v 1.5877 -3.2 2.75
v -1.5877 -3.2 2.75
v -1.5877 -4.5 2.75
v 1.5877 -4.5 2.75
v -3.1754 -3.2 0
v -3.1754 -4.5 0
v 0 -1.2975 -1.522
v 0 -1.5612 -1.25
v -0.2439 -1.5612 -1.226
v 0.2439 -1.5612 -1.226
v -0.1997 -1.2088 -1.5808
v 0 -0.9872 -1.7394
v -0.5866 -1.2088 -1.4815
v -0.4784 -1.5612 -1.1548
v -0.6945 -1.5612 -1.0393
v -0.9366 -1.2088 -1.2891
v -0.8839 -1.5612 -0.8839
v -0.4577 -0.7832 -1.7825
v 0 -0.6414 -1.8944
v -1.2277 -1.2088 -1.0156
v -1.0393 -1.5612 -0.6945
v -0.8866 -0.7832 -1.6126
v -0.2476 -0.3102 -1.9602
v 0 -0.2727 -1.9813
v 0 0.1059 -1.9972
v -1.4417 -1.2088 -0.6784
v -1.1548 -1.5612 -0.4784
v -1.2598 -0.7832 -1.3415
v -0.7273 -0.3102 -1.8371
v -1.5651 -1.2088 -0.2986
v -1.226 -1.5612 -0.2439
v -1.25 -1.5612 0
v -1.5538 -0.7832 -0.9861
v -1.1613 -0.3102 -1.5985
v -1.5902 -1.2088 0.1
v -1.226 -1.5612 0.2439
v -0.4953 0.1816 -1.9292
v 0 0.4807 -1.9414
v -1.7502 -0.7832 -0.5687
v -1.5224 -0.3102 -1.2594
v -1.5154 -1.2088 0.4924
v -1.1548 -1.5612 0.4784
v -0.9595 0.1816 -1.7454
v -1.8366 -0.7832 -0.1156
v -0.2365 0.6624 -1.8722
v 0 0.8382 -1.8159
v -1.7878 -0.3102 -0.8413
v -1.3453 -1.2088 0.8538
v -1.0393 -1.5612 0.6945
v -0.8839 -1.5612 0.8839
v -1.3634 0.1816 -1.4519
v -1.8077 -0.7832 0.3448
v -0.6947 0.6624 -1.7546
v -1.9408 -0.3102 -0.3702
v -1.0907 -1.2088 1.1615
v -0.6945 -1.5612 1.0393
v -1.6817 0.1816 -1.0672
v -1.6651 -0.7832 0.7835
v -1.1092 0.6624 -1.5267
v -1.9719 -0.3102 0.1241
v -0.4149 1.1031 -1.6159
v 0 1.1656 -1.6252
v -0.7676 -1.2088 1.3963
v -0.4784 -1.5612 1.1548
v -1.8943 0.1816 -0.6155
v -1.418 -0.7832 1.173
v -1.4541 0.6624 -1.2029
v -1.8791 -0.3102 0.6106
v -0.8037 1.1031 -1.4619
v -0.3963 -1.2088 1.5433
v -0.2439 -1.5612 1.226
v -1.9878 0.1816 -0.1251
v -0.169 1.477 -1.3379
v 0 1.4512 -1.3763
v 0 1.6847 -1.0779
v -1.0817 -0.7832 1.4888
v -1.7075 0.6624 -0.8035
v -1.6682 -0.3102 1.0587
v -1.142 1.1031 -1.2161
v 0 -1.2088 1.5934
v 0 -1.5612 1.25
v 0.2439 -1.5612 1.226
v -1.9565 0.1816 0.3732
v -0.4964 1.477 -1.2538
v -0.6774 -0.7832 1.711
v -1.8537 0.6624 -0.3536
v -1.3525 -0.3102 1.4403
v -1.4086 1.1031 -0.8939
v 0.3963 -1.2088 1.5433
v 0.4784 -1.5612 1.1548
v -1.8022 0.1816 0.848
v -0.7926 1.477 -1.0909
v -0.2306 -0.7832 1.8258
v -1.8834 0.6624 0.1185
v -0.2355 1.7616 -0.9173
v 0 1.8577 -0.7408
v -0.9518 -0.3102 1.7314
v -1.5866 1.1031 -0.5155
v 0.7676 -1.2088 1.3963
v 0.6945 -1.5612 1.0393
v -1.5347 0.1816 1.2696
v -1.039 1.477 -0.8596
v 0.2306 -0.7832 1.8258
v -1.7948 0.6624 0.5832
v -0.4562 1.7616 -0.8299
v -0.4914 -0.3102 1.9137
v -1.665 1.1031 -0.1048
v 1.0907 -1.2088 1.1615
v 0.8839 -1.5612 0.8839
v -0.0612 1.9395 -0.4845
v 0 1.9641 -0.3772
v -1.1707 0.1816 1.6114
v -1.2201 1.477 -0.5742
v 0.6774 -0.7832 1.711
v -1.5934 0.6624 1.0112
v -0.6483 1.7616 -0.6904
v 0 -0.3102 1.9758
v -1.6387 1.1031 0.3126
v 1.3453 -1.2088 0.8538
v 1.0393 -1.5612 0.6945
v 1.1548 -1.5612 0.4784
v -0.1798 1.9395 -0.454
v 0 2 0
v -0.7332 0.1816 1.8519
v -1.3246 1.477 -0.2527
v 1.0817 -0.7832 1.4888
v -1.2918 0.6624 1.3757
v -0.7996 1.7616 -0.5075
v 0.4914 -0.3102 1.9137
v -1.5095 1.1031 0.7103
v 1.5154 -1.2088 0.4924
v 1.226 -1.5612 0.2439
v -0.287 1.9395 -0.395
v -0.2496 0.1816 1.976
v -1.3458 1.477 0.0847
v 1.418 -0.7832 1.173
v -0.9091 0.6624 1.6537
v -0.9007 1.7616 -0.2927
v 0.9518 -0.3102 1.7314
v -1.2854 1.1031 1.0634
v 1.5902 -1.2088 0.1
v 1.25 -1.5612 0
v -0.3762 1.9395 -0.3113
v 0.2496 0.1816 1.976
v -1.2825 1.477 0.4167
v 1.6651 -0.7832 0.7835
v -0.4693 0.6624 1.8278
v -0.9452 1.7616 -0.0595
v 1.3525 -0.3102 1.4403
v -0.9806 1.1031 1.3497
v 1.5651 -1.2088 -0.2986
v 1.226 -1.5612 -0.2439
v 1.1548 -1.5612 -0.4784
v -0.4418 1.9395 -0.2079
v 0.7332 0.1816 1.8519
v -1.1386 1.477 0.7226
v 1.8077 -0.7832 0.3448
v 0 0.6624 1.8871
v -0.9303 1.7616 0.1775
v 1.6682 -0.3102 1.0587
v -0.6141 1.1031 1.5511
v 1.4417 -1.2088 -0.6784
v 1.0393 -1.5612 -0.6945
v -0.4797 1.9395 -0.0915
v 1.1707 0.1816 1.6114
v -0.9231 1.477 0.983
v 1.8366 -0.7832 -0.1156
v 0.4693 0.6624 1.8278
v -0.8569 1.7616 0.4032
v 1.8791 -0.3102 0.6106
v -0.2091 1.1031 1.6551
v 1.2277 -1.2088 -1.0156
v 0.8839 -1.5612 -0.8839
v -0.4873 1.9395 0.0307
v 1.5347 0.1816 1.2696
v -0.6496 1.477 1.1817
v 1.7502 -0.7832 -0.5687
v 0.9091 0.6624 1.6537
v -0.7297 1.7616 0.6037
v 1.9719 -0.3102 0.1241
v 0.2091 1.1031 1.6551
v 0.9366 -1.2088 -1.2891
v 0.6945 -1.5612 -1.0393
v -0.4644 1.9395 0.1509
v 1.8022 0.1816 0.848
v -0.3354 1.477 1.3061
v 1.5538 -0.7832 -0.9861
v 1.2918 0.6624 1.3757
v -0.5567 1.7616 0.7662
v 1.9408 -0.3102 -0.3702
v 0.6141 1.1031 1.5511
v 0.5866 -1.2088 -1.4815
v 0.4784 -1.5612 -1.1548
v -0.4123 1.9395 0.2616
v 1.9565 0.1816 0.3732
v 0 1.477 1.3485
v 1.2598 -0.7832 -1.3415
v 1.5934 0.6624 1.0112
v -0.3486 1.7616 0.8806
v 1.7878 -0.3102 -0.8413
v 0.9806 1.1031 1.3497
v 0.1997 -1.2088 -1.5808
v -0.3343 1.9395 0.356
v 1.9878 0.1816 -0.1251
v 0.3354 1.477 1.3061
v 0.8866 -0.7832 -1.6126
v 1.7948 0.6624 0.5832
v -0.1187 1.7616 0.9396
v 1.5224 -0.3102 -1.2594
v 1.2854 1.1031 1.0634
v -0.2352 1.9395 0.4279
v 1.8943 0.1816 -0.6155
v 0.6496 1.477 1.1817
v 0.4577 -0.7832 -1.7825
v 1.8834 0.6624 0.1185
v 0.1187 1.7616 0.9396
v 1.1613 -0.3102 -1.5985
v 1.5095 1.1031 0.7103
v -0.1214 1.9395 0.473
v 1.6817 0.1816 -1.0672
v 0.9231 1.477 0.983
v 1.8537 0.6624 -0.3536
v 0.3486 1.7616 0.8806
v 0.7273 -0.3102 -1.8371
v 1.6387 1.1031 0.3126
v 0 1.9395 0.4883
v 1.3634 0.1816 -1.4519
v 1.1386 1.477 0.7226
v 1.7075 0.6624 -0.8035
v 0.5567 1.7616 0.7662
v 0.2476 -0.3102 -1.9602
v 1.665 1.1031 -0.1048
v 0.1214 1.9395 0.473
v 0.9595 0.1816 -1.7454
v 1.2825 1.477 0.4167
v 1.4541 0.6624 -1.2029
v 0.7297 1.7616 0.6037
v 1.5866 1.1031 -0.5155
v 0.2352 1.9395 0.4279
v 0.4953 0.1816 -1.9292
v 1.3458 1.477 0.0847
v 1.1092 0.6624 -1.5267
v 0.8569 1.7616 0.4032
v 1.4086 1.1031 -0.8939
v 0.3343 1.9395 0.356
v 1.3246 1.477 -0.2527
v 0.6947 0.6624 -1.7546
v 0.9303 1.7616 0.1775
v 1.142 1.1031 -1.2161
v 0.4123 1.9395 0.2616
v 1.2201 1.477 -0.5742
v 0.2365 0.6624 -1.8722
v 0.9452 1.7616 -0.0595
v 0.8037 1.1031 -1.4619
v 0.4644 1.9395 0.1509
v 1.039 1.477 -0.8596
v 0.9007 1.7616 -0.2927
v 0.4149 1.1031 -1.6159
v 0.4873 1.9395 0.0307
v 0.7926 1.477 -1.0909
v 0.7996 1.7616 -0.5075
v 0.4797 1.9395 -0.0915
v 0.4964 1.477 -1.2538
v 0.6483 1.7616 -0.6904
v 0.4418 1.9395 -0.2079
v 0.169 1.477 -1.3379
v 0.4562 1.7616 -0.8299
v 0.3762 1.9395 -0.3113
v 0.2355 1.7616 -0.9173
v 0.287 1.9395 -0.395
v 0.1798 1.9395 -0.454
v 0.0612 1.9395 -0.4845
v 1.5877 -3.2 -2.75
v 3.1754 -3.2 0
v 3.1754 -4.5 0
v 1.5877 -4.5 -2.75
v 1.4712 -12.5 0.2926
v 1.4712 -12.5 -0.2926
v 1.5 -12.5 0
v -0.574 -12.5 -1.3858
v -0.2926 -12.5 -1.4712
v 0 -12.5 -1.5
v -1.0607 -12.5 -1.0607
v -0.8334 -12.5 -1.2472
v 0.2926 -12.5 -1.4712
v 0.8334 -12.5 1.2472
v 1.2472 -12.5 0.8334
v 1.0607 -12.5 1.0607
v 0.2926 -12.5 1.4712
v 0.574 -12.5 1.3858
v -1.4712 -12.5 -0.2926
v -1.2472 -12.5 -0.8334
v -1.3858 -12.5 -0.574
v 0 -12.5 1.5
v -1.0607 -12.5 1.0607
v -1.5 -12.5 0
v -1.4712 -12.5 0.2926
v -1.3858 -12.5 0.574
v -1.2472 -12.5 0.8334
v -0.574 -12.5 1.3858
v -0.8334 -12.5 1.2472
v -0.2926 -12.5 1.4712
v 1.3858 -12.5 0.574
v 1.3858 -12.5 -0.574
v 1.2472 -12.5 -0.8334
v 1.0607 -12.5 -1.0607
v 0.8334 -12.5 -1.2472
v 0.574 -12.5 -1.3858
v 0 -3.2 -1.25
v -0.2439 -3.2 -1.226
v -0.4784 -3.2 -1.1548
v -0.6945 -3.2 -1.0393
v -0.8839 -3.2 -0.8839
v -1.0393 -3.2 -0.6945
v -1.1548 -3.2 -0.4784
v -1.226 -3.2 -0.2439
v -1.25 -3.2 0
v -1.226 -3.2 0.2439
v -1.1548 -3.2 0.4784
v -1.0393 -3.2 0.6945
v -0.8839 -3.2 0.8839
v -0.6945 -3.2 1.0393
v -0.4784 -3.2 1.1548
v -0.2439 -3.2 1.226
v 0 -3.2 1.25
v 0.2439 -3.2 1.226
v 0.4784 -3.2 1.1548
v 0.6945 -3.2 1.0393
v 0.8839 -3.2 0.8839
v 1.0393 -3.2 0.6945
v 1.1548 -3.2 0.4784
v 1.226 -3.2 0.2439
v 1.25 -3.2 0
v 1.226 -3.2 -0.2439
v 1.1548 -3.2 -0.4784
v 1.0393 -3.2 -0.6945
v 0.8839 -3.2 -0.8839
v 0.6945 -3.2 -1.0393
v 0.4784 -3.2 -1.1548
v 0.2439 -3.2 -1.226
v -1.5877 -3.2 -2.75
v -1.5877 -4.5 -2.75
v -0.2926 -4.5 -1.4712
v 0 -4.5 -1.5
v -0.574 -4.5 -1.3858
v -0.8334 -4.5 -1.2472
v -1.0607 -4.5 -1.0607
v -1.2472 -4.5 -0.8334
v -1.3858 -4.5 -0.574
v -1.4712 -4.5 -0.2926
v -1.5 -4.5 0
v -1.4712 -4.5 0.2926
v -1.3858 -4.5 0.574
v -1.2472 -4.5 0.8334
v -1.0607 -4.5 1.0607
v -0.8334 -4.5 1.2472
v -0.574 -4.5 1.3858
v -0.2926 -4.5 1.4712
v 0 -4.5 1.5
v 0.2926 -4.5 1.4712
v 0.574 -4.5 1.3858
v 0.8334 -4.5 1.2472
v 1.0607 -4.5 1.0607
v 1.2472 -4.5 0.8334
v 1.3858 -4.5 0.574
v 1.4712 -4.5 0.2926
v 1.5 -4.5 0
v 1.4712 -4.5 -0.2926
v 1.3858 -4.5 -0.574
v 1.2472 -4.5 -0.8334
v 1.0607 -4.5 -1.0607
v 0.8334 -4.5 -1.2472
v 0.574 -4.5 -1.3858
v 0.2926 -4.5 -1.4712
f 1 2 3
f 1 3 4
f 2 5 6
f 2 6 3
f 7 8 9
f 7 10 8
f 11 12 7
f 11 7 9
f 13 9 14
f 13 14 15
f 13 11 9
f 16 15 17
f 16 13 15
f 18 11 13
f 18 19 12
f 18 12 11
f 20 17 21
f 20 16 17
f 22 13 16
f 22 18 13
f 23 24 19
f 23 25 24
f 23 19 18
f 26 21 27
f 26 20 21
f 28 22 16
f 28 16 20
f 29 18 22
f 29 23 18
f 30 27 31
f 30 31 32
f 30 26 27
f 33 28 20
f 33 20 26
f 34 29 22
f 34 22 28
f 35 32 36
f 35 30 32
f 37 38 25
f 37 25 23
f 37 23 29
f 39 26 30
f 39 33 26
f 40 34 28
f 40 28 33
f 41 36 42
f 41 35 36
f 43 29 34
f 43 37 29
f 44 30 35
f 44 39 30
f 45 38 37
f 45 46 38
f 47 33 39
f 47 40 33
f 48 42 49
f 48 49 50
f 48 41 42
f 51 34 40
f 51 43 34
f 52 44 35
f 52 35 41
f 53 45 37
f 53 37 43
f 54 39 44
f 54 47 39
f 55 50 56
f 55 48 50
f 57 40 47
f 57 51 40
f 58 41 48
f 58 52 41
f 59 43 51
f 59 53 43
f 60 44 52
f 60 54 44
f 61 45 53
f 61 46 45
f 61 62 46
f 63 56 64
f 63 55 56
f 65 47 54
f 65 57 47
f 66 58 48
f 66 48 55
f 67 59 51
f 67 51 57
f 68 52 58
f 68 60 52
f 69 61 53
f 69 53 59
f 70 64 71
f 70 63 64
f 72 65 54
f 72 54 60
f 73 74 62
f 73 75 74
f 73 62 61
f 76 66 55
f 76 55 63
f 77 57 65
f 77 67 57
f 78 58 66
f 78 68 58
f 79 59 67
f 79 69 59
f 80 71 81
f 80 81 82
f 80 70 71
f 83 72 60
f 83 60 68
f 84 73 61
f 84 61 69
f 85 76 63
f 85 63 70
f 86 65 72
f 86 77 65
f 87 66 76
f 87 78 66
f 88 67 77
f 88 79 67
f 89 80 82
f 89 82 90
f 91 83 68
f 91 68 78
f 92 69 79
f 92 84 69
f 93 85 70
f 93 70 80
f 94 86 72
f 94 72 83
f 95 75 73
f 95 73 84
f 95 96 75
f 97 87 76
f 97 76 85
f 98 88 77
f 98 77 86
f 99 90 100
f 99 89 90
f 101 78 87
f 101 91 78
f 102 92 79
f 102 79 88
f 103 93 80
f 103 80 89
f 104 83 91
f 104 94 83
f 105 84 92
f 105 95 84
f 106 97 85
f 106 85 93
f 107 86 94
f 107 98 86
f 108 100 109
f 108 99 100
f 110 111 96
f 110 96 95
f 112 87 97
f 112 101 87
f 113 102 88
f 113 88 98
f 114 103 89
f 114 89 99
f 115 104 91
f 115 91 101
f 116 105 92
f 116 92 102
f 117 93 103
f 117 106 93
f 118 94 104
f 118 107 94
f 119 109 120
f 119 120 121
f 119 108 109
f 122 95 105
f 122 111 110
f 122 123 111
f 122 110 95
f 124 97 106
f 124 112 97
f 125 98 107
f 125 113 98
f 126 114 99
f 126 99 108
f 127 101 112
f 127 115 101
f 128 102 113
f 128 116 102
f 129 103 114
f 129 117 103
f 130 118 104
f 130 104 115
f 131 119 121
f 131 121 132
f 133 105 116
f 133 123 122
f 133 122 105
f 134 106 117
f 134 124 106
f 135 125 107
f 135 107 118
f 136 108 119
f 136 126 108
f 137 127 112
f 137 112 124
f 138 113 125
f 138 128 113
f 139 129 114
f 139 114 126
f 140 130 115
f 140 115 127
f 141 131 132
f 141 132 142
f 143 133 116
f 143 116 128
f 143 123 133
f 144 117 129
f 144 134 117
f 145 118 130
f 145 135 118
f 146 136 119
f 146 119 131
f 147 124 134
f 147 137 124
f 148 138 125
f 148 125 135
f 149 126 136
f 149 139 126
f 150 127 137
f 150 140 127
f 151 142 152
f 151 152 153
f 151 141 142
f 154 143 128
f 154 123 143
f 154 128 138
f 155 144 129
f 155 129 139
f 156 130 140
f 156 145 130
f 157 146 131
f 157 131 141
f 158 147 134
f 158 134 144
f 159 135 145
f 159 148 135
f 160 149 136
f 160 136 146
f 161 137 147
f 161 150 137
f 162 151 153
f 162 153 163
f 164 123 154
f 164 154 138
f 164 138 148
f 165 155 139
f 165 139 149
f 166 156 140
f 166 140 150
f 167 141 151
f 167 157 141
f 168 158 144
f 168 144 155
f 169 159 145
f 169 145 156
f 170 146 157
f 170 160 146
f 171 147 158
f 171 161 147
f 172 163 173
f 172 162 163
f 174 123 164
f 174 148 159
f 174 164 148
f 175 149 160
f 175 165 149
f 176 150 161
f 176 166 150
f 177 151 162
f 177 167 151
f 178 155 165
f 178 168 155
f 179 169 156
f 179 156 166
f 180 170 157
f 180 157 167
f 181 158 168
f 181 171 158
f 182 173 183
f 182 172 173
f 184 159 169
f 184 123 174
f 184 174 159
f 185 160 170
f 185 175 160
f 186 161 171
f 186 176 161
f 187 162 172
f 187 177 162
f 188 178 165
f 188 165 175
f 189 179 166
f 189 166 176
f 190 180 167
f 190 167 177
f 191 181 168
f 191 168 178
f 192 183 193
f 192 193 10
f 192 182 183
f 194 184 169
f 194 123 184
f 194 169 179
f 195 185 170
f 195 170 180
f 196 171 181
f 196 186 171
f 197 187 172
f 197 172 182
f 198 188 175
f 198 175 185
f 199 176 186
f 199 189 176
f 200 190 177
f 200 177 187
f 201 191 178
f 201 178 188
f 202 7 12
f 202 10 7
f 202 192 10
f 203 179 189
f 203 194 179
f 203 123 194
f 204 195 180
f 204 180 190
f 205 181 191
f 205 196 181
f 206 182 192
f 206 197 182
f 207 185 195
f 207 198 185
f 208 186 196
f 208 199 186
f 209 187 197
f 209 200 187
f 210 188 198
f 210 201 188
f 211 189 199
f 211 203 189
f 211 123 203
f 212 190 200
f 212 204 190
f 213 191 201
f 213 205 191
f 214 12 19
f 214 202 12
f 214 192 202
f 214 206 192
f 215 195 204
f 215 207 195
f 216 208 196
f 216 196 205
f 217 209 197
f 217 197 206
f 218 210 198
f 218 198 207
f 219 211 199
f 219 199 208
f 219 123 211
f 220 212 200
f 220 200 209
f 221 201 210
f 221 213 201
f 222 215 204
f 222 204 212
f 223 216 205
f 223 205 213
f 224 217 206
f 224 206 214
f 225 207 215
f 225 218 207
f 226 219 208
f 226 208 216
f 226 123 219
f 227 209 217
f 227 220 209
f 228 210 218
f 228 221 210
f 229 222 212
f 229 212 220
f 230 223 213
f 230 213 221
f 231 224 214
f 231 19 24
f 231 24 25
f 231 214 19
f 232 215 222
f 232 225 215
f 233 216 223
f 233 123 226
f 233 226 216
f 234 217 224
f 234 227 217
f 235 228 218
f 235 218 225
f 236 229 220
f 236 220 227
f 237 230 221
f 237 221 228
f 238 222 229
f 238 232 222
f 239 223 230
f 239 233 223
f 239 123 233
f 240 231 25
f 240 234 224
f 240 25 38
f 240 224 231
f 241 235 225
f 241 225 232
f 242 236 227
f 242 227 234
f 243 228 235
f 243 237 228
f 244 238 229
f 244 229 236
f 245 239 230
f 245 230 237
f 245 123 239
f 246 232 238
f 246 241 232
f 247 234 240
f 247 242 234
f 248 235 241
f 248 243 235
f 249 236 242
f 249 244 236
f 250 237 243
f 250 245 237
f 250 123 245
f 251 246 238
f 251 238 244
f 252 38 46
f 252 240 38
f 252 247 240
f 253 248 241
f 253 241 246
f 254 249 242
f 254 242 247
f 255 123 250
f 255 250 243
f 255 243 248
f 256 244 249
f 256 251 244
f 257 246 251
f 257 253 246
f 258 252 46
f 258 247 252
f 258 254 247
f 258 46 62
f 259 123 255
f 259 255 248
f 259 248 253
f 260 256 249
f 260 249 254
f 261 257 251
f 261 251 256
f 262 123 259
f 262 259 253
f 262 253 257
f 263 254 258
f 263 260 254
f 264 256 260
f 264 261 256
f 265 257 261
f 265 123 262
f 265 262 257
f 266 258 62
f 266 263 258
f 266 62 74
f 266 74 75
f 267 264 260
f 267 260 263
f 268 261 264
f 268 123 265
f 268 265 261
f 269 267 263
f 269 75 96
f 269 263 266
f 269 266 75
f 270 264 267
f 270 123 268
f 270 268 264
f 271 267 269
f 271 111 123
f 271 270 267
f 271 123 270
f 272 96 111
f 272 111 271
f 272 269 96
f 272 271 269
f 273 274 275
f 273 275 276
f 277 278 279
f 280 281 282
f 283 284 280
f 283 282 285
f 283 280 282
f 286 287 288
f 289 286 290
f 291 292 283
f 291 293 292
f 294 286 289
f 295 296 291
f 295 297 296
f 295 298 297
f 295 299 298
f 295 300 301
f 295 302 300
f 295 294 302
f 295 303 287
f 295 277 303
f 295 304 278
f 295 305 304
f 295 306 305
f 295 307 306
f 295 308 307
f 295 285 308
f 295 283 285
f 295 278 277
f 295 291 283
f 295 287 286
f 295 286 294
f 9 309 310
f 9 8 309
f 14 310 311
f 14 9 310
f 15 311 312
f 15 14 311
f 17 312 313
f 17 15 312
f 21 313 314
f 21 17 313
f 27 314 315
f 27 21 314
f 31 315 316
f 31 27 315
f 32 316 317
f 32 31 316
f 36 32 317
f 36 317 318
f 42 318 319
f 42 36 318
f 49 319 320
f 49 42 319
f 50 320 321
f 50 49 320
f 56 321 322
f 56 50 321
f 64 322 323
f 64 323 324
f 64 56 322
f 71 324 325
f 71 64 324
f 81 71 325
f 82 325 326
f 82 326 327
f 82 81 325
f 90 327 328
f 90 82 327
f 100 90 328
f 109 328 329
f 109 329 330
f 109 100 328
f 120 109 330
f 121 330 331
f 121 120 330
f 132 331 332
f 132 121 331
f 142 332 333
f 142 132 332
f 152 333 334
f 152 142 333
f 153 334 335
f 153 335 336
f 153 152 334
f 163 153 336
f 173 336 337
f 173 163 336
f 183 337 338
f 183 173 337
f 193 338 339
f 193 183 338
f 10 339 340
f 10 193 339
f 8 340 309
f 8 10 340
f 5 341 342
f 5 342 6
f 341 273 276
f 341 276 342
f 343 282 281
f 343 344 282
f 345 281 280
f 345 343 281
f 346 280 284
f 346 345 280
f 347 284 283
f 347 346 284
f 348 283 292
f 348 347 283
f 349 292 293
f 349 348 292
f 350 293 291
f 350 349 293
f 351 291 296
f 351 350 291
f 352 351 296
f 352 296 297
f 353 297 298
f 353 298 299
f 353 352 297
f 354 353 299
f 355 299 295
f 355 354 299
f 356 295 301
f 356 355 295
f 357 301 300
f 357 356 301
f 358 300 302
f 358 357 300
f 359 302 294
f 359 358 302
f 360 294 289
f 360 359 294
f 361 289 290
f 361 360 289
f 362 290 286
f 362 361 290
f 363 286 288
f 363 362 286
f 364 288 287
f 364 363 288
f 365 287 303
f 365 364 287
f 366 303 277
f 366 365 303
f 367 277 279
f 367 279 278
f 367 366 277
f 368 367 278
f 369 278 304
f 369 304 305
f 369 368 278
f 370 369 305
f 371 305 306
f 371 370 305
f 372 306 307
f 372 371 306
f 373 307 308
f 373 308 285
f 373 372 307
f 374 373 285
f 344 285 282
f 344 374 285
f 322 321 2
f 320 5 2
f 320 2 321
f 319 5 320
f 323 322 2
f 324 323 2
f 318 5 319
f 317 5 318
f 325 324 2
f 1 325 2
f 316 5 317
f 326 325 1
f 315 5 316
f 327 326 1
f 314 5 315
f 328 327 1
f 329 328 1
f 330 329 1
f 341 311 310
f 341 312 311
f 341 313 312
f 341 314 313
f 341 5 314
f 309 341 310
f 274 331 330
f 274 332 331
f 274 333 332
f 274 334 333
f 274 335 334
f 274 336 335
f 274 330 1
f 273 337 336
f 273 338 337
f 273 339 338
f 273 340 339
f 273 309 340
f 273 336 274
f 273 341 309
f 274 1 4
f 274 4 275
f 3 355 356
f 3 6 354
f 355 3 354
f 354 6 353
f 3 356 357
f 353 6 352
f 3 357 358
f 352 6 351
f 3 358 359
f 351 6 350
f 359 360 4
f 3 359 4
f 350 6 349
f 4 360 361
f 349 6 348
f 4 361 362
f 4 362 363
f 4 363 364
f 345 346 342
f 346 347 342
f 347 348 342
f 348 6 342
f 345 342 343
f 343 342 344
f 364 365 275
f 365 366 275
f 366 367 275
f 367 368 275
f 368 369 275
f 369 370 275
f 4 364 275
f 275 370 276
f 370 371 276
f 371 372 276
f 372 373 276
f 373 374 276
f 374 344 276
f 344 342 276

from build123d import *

# Parameters (mm, degrees)
BOSS_EXTRU_1_DEPTH = 1.3


with BuildPart() as part:
    # Esquisse1 → Révolution1 (revolve)
    with BuildSketch(Plane.XY, mode=Mode.PRIVATE) as r_volution1_sk:
        with BuildLine():
            Line((0, 2), (0, -12.5))
            Line((0, -12.5), (1.5, -12.5))
            Line((1.5, -12.5), (1.5, -4.5))
            Line((1.5, -4.5), (2.75, -4.5))
            Line((2.75, -4.5), (2.75, -3.2))
            Line((2.75, -3.2), (1.25, -3.2))
            Line((1.25, -3.2), (1.25, -1.5612495))
            ThreePointArc((1.25, -1.5612495), (1.887127314, 0.662382443), (0, 2))
        make_face()
    revolve(r_volution1_sk.sketch.rotate(Axis((0, 0, 0), (0, 1, 0)), 90), axis=Axis((0, 0, 0), (0, 1, 0)))

    # Esquisse2 → Boss.-Extru.1 (add)
    with BuildSketch(Plane(origin=(0, -3.2, 0), x_dir=(1, 0, 0), z_dir=(0, 1, 0))):
        Polygon((1.58771324, 2.75), (-1.58771324, 2.75), (-3.175426481, 0), (-1.58771324, -2.75), (1.58771324, -2.75), (3.175426481, 0), align=None)
    extrude(amount=-BOSS_EXTRU_1_DEPTH)


solid = part.part
